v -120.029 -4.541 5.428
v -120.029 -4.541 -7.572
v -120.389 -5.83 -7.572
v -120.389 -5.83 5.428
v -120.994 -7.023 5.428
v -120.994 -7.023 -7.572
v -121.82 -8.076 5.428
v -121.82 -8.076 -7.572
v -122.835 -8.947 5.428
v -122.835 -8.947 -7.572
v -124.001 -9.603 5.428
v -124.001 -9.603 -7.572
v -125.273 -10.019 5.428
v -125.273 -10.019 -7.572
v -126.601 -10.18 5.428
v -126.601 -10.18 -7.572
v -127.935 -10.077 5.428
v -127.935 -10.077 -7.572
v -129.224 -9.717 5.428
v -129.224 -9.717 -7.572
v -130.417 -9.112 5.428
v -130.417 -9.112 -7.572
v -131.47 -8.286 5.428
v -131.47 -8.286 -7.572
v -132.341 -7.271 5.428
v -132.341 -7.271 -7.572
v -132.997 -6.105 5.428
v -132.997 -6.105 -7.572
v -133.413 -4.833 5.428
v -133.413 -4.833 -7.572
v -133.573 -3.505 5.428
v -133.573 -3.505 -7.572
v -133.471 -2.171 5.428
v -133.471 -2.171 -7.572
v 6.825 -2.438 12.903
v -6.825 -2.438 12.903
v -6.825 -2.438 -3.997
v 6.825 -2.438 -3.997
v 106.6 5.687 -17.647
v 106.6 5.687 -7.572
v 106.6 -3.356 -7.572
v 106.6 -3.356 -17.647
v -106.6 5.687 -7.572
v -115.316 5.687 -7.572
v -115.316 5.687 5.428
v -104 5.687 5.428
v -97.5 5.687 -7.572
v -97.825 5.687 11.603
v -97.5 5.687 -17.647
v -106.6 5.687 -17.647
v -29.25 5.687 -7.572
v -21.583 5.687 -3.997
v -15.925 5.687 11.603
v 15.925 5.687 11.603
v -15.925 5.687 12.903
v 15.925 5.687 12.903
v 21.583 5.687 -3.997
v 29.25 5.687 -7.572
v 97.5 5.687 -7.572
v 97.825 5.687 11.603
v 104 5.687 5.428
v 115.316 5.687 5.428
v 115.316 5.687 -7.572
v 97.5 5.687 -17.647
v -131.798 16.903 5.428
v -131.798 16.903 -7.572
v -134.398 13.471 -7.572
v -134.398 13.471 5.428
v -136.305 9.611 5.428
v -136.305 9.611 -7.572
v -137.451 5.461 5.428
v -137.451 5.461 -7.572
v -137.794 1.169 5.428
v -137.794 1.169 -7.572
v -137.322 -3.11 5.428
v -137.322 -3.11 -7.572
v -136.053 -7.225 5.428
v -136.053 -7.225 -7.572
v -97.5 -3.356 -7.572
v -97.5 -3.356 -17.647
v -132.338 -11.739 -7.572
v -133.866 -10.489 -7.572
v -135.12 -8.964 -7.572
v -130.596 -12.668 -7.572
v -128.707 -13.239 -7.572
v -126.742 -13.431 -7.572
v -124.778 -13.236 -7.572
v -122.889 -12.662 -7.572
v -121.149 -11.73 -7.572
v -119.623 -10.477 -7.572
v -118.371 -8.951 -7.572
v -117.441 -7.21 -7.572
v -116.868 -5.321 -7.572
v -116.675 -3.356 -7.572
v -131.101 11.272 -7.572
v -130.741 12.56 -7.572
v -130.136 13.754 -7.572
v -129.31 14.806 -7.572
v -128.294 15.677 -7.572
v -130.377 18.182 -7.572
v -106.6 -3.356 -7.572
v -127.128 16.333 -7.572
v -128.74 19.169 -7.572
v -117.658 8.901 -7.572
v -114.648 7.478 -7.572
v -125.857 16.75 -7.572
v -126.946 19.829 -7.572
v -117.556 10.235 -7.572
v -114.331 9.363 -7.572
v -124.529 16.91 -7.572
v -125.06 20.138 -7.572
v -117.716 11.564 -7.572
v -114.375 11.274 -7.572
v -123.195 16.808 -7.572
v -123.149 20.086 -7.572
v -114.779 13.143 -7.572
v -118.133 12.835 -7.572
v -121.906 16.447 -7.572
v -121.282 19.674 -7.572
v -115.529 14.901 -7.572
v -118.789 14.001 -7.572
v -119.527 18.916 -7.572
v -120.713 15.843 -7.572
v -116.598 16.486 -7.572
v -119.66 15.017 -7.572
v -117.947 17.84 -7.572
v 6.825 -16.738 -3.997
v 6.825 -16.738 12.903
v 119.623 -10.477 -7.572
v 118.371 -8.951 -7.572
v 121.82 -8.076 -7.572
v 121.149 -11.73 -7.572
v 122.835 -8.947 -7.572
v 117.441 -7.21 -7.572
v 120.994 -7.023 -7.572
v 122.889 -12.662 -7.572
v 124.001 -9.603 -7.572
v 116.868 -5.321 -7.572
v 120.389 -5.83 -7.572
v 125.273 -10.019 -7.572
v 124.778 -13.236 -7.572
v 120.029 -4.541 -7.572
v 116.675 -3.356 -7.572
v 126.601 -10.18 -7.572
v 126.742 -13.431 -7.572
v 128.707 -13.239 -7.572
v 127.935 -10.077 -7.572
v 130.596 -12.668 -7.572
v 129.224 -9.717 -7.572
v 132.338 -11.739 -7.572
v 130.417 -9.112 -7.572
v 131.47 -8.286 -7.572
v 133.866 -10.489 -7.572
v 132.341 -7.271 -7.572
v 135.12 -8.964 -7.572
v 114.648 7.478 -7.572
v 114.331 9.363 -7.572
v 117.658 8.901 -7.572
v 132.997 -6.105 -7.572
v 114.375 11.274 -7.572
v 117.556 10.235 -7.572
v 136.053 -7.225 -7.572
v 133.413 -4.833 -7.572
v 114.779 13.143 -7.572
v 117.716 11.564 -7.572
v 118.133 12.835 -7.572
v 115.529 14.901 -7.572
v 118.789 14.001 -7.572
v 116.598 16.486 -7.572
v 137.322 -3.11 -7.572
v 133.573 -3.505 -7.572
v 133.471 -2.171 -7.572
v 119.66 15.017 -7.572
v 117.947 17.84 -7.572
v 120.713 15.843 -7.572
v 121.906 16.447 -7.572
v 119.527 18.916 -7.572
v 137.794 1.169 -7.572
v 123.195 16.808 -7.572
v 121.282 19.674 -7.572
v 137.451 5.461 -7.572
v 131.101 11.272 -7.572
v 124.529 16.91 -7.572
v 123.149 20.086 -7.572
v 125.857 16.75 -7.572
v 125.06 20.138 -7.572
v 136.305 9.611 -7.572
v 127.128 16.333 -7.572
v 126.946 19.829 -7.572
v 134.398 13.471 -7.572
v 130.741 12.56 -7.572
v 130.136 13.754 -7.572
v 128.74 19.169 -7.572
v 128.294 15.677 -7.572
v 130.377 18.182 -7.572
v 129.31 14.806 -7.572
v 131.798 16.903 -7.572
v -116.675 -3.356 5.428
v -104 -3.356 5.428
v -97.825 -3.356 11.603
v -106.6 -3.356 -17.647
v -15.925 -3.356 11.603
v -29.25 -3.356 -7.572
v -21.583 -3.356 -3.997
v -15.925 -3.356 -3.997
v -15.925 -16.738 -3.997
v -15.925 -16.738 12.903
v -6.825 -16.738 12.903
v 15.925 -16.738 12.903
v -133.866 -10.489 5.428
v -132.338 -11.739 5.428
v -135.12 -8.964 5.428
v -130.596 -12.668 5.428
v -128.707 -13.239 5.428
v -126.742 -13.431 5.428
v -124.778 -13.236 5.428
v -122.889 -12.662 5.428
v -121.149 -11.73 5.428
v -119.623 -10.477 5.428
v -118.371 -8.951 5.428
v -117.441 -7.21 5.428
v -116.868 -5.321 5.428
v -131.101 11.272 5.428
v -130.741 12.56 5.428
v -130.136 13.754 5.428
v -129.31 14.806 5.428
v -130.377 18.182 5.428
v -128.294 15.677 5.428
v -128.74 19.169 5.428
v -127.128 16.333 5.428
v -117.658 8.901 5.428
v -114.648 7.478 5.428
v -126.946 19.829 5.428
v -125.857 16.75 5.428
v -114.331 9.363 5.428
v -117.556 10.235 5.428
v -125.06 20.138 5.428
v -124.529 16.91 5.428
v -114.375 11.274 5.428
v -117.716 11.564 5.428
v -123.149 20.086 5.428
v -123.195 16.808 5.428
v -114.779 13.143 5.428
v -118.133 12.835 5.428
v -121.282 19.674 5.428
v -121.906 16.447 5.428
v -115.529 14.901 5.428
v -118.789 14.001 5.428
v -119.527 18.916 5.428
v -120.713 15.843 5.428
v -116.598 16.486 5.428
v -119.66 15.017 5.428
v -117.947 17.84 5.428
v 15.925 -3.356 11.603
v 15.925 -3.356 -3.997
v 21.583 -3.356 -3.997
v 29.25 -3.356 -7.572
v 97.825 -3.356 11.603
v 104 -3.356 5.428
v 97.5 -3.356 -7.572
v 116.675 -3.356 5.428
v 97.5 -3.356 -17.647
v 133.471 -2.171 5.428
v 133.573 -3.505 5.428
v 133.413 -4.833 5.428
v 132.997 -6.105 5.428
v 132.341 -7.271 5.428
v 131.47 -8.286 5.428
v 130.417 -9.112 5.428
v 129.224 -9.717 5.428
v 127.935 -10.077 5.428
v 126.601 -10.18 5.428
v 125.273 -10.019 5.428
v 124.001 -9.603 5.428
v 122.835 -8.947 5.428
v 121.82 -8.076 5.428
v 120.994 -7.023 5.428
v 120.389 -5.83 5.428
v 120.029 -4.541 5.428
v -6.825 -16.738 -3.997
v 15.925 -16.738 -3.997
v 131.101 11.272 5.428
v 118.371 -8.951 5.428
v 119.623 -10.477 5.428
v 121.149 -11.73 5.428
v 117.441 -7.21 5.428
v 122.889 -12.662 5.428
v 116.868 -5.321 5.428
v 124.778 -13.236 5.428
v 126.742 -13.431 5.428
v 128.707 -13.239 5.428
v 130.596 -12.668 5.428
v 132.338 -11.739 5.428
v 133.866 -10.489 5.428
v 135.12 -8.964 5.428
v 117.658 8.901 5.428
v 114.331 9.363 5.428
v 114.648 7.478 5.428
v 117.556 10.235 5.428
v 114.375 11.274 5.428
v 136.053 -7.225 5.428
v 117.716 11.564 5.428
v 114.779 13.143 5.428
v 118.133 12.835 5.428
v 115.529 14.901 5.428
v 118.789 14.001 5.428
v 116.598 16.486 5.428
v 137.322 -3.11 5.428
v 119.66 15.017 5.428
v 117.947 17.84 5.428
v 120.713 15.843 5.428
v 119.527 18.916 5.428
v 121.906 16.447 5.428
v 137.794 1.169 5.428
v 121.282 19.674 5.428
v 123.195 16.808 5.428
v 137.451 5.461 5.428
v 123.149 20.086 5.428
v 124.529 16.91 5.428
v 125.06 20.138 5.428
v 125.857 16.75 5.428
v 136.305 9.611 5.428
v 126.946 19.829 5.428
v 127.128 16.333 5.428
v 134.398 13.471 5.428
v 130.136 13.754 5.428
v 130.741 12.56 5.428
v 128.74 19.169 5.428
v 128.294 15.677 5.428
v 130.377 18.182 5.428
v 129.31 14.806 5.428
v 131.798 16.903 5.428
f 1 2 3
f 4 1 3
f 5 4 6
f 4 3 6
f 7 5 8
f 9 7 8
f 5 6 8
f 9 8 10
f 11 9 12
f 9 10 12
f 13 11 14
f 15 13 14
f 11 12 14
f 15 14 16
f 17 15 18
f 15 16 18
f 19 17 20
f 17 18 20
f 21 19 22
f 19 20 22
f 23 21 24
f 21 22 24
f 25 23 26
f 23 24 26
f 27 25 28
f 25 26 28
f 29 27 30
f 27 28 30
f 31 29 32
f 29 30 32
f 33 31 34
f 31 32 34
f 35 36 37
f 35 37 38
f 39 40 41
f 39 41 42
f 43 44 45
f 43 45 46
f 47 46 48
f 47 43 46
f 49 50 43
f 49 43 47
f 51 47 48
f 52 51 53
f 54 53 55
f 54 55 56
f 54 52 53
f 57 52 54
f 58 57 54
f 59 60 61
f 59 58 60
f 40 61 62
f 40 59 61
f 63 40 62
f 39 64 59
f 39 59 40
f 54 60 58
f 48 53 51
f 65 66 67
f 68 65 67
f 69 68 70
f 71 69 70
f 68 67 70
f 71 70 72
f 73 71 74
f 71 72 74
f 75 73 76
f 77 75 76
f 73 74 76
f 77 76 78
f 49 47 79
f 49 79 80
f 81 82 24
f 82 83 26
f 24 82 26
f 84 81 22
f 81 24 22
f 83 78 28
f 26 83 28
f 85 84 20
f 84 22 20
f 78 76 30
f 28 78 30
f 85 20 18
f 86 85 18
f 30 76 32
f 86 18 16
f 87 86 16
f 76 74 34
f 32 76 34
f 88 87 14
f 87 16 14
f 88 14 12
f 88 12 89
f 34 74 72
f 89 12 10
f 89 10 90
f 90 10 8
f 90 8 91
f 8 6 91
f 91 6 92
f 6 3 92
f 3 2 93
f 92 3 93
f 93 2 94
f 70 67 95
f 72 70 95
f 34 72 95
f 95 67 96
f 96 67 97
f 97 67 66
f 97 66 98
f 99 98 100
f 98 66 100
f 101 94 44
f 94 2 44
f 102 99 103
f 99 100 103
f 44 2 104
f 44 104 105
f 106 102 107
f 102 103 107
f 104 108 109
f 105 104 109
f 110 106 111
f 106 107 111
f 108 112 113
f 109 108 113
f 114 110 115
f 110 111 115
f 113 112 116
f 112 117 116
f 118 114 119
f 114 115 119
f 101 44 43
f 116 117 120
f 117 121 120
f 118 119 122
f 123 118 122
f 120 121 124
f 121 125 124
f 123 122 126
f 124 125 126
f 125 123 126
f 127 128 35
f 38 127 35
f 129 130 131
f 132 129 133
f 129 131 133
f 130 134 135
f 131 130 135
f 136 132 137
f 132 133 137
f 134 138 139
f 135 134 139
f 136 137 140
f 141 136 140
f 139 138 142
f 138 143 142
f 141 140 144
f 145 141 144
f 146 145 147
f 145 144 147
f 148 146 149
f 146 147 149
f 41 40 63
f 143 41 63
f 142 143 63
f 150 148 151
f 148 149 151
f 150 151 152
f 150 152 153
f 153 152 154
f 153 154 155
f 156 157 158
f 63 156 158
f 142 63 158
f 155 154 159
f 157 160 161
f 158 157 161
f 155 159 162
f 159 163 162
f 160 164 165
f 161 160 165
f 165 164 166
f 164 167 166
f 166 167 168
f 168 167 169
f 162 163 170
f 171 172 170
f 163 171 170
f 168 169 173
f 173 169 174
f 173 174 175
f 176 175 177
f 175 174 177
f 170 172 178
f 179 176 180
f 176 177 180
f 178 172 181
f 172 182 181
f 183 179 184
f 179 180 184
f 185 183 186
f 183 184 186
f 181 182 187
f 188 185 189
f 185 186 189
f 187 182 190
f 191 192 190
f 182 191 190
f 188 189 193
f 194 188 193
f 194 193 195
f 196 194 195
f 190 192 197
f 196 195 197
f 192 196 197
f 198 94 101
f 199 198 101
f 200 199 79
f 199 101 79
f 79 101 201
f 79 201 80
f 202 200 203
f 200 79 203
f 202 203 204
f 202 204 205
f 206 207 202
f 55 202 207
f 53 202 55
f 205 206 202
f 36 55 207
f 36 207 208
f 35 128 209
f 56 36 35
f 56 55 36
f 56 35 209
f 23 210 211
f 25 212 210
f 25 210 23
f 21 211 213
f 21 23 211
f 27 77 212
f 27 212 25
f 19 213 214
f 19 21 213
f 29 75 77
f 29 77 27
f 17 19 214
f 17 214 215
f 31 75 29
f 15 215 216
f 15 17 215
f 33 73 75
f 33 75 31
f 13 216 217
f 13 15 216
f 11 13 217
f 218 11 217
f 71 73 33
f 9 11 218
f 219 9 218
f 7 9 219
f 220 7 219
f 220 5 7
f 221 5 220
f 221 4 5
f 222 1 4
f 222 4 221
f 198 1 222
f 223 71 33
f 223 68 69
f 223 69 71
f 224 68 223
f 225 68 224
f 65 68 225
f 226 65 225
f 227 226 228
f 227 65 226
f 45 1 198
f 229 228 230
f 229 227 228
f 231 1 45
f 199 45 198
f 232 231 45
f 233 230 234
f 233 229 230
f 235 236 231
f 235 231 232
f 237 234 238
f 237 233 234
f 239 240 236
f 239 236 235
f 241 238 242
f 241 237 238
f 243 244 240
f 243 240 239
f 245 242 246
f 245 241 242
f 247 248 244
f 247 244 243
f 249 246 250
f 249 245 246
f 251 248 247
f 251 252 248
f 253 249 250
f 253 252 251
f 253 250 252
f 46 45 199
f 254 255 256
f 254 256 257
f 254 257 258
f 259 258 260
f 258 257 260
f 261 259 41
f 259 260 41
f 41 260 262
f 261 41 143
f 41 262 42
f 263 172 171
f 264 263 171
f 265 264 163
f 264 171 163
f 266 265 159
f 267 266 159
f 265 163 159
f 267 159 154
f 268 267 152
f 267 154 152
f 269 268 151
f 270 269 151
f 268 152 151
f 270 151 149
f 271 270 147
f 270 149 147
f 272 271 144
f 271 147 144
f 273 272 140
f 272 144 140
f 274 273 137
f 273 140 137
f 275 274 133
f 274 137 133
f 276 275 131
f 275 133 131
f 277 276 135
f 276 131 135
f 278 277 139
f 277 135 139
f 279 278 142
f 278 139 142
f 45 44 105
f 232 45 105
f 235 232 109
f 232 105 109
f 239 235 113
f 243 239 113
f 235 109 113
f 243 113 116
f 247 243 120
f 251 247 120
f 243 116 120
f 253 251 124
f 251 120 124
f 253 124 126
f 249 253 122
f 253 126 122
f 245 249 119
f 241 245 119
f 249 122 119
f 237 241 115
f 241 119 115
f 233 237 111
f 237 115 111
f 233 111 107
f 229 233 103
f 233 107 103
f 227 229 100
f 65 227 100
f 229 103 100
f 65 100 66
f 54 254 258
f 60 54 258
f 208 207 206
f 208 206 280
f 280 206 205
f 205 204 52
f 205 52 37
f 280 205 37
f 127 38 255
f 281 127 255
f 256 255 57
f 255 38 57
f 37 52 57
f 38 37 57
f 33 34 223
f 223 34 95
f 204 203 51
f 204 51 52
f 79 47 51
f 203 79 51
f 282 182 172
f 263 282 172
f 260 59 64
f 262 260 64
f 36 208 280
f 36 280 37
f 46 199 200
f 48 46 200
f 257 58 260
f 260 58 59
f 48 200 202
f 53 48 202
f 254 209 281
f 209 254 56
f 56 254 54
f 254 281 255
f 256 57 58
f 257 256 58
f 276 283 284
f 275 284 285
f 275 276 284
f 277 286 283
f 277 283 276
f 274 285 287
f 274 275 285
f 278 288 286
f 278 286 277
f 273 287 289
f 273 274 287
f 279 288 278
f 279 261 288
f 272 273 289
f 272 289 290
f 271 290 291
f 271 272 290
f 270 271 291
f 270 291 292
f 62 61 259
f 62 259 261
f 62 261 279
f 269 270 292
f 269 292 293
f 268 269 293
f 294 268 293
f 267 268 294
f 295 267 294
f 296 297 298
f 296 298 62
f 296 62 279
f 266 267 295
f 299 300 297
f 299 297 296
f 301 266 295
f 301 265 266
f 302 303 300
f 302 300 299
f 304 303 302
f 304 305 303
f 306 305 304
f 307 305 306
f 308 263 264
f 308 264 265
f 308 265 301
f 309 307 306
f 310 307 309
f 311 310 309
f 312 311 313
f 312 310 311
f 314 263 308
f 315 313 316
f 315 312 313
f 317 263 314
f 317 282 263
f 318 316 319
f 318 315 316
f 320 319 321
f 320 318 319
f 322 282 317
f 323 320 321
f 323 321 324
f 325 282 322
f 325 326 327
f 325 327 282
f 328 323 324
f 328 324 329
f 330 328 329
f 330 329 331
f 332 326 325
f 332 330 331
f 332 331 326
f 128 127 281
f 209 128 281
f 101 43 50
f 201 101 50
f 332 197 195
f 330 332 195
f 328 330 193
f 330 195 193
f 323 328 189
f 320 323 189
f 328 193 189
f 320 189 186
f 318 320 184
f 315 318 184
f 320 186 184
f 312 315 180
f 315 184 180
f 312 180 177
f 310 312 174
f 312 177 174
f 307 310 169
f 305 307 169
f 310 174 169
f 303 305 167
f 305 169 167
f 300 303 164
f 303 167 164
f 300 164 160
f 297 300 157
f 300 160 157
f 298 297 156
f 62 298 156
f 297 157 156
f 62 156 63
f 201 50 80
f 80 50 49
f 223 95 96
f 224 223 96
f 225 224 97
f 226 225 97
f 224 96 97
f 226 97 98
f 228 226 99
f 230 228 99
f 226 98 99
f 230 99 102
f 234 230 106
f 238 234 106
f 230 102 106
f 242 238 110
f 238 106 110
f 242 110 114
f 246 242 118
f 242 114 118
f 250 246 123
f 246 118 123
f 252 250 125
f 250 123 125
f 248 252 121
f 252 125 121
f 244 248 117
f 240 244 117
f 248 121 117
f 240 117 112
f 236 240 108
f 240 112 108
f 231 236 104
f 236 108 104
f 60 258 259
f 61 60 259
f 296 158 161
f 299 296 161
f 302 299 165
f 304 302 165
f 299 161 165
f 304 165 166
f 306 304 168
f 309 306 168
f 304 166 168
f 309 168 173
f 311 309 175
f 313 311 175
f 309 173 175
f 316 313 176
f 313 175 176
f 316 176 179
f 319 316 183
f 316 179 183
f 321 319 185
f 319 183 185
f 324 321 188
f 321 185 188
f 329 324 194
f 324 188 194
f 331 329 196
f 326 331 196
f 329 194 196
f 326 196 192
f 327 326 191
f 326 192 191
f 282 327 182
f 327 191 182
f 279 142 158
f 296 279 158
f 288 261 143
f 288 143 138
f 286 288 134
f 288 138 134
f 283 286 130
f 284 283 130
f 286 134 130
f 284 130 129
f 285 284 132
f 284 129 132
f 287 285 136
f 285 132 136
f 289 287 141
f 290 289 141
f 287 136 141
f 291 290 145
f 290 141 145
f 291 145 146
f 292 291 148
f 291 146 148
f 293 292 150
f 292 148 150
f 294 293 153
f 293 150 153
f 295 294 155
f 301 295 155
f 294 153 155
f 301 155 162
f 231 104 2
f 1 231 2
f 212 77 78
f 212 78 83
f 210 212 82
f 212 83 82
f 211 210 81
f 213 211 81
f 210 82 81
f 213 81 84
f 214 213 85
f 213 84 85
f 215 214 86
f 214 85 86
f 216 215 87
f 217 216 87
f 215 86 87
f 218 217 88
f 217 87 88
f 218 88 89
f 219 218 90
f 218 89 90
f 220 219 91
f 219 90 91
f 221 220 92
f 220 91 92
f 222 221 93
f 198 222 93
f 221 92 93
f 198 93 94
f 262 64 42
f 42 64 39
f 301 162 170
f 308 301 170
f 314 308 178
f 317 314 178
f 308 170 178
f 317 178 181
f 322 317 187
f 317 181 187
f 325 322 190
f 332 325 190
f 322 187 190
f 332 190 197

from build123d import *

# Parameters (mm, degrees)
BOSS_EXTRU_1_DEPTH      = 2
BOSS_EXTRU_2_DEPTH      = 1.39125117
ENL_V_MAT_EXTRU_1_DEPTH = 2
BOSS_EXTRU_3_DEPTH      = 0.2
BOSS_EXTRU_3_DEPTH_BACK = 2.4
ESQUISSE4_W             = 4.9
ESQUISSE4_H             = 3.45
ESQUISSE5_W             = 2.1
ESQUISSE5_H             = 2.2
ENL_V_MAT_EXTRU_2_DEPTH = 4
ESQUISSE6_W             = 1.4
ESQUISSE6_H             = 1.55
BOSS_EXTRU_4_DEPTH      = 1.39125117
SCALE1_SCALE            = 6.5


with BuildPart() as part:
    # Esquisse1 → Boss.-Extru.1 (new body)
    with BuildSketch(Plane.XY):
        with BuildLine():
            Line((-17.95, 0), (17.95, 0))
            ThreePointArc((17.95, 0), (19.19656242, -1.520008433), (20.931194368, -0.595132491))
            ThreePointArc((20.931194368, -0.595132491), (21.146292286, 1.356483691), (20.276674314, 3.116835194))
            ThreePointArc((20.276674314, 3.116835194), (18.263317154, 3.349532273), (17.740928308, 1.39125117))
            Line((17.740928308, 1.39125117), (-17.740928308, 1.39125117))
            ThreePointArc((-17.740928308, 1.39125117), (-18.263317154, 3.349532273), (-20.276674314, 3.116835194))
            ThreePointArc((-20.276674314, 3.116835194), (-21.146292286, 1.356483691), (-20.931194368, -0.595132491))
            ThreePointArc((-20.931194368, -0.595132491), (-19.19656242, -1.520008433), (-17.95, 0))
        make_face()
        with BuildLine():
            Line((-20.534048141, 0.182330587), (-20.169386968, 2.250426868))
            ThreePointArc((-20.169386968, 2.250426868), (-18.95300824, 3.102144422), (-18.101290686, 1.885765695))
            Line((-18.101290686, 1.885765695), (-18.465951859, -0.182330587))
            ThreePointArc((-18.465951859, -0.182330587), (-19.682330587, -1.034048141), (-20.534048141, 0.182330587))
        make_face(mode=Mode.SUBTRACT)
        with BuildLine():
            Line((18.465951859, -0.182330587), (18.101290686, 1.885765695))
            ThreePointArc((18.101290686, 1.885765695), (18.95300824, 3.102144422), (20.169386968, 2.250426868))
            Line((20.169386968, 2.250426868), (20.534048141, 0.182330587))
            ThreePointArc((20.534048141, 0.182330587), (19.682330587, -1.034048141), (18.465951859, -0.182330587))
        make_face(mode=Mode.SUBTRACT)
    extrude(amount=BOSS_EXTRU_1_DEPTH)

    # Esquisse2 → Boss.-Extru.2 (add)
    with BuildSketch(Plane.XZ):
        Polygon((-16, 2), (-15.05, 2.95), (15.05, 2.95), (16, 2), align=None)
    extrude(amount=-BOSS_EXTRU_2_DEPTH)

    # Esquisse3 → Enlèv. mat.-Extru.1 (cut)
    with BuildSketch(Plane.XZ):
        Polygon((-4.5, 0), (-3.320521194, 0.55), (3.320521194, 0.55), (4.5, 0), align=None)
    extrude(amount=-ENL_V_MAT_EXTRU_1_DEPTH, mode=Mode.SUBTRACT)

    # Esquisse4 → Boss.-Extru.3 (add, two sides: drawn at the far end of the back side and taken through both)
    with BuildSketch(Plane.XY.offset(2.95).offset(-BOSS_EXTRU_3_DEPTH_BACK)):
        with Locations((0, -0.33374883)):
            Rectangle(ESQUISSE4_W, ESQUISSE4_H)
    extrude(amount=BOSS_EXTRU_3_DEPTH + BOSS_EXTRU_3_DEPTH_BACK)

    # Esquisse5 → Enlèv. mat.-Extru.2 (cut)
    with BuildSketch(Plane.XY.offset(3.15)):
        with Locations((0, -0.95874883)):
            Rectangle(ESQUISSE5_W, ESQUISSE5_H)
    extrude(amount=-ENL_V_MAT_EXTRU_2_DEPTH, mode=Mode.SUBTRACT)

    # Esquisse6 → Boss.-Extru.4 (add)
    with BuildSketch(Plane(origin=(0, 1.39125117, 0), x_dir=(1, 0, 0), z_dir=(0, 1, 0))):
        with Locations((-15.7, 0.775)):
            Rectangle(ESQUISSE6_W, ESQUISSE6_H)
        with Locations((15.7, 0.775)):
            Rectangle(ESQUISSE6_W, ESQUISSE6_H)
    extrude(amount=-BOSS_EXTRU_4_DEPTH)


with BuildPart() as part_1:
    # Scale1: scaled about (0, 0.610214787, 1.376752435)
    add(part.part.scale(SCALE1_SCALE).moved(Location((0, -3.356181328, -7.572138393))))


solid = part_1.part
